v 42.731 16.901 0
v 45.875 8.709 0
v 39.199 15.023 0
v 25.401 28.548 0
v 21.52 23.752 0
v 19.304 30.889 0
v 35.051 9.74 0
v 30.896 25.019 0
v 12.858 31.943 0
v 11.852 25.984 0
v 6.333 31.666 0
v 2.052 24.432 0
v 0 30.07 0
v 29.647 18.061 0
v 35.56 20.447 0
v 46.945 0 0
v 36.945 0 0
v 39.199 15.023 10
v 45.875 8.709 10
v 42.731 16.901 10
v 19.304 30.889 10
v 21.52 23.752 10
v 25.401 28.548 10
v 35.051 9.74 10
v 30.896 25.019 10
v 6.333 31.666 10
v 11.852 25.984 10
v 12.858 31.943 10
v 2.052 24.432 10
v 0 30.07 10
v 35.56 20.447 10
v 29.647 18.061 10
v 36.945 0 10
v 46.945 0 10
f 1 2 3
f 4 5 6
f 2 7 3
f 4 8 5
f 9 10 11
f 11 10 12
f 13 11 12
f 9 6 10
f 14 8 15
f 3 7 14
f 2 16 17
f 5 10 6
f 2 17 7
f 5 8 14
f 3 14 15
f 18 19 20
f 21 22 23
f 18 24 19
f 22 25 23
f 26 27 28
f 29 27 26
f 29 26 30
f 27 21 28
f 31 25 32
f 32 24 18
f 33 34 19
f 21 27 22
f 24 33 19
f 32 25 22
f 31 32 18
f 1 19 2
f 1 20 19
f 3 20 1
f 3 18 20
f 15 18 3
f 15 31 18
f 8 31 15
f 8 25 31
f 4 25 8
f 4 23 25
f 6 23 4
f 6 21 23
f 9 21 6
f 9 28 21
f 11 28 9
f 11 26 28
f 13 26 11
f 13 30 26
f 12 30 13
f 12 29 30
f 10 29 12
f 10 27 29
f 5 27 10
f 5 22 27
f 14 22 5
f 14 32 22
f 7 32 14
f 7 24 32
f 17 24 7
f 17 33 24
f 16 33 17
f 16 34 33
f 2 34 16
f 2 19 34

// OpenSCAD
$fn = 32;

// ----------------------------------------------------------------------
// Arc stop: segment, 10 mm thick
// ----------------------------------------------------------------------

// --- parameters (mm) ---
profile_height = 10;      // extrusion height
profile_points = 17;      // points of the closed outline

profile = [[46.945, 0], [45.875, 8.709], [42.731, 16.901], [39.199, 15.023], [35.56, 20.447], [30.896, 25.019], [25.401, 28.548], [19.304, 30.889], [12.858, 31.943], [6.333, 31.666], [0, 30.07], [2.052, 24.432], [11.852, 25.984], [21.52, 23.752], [29.647, 18.061], [35.051, 9.74], [36.945, 0]];  // single closed polygon, 17 points, counter clockwise

// --- the one profile operation ---
linear_extrude(height = profile_height) polygon(points = profile);
